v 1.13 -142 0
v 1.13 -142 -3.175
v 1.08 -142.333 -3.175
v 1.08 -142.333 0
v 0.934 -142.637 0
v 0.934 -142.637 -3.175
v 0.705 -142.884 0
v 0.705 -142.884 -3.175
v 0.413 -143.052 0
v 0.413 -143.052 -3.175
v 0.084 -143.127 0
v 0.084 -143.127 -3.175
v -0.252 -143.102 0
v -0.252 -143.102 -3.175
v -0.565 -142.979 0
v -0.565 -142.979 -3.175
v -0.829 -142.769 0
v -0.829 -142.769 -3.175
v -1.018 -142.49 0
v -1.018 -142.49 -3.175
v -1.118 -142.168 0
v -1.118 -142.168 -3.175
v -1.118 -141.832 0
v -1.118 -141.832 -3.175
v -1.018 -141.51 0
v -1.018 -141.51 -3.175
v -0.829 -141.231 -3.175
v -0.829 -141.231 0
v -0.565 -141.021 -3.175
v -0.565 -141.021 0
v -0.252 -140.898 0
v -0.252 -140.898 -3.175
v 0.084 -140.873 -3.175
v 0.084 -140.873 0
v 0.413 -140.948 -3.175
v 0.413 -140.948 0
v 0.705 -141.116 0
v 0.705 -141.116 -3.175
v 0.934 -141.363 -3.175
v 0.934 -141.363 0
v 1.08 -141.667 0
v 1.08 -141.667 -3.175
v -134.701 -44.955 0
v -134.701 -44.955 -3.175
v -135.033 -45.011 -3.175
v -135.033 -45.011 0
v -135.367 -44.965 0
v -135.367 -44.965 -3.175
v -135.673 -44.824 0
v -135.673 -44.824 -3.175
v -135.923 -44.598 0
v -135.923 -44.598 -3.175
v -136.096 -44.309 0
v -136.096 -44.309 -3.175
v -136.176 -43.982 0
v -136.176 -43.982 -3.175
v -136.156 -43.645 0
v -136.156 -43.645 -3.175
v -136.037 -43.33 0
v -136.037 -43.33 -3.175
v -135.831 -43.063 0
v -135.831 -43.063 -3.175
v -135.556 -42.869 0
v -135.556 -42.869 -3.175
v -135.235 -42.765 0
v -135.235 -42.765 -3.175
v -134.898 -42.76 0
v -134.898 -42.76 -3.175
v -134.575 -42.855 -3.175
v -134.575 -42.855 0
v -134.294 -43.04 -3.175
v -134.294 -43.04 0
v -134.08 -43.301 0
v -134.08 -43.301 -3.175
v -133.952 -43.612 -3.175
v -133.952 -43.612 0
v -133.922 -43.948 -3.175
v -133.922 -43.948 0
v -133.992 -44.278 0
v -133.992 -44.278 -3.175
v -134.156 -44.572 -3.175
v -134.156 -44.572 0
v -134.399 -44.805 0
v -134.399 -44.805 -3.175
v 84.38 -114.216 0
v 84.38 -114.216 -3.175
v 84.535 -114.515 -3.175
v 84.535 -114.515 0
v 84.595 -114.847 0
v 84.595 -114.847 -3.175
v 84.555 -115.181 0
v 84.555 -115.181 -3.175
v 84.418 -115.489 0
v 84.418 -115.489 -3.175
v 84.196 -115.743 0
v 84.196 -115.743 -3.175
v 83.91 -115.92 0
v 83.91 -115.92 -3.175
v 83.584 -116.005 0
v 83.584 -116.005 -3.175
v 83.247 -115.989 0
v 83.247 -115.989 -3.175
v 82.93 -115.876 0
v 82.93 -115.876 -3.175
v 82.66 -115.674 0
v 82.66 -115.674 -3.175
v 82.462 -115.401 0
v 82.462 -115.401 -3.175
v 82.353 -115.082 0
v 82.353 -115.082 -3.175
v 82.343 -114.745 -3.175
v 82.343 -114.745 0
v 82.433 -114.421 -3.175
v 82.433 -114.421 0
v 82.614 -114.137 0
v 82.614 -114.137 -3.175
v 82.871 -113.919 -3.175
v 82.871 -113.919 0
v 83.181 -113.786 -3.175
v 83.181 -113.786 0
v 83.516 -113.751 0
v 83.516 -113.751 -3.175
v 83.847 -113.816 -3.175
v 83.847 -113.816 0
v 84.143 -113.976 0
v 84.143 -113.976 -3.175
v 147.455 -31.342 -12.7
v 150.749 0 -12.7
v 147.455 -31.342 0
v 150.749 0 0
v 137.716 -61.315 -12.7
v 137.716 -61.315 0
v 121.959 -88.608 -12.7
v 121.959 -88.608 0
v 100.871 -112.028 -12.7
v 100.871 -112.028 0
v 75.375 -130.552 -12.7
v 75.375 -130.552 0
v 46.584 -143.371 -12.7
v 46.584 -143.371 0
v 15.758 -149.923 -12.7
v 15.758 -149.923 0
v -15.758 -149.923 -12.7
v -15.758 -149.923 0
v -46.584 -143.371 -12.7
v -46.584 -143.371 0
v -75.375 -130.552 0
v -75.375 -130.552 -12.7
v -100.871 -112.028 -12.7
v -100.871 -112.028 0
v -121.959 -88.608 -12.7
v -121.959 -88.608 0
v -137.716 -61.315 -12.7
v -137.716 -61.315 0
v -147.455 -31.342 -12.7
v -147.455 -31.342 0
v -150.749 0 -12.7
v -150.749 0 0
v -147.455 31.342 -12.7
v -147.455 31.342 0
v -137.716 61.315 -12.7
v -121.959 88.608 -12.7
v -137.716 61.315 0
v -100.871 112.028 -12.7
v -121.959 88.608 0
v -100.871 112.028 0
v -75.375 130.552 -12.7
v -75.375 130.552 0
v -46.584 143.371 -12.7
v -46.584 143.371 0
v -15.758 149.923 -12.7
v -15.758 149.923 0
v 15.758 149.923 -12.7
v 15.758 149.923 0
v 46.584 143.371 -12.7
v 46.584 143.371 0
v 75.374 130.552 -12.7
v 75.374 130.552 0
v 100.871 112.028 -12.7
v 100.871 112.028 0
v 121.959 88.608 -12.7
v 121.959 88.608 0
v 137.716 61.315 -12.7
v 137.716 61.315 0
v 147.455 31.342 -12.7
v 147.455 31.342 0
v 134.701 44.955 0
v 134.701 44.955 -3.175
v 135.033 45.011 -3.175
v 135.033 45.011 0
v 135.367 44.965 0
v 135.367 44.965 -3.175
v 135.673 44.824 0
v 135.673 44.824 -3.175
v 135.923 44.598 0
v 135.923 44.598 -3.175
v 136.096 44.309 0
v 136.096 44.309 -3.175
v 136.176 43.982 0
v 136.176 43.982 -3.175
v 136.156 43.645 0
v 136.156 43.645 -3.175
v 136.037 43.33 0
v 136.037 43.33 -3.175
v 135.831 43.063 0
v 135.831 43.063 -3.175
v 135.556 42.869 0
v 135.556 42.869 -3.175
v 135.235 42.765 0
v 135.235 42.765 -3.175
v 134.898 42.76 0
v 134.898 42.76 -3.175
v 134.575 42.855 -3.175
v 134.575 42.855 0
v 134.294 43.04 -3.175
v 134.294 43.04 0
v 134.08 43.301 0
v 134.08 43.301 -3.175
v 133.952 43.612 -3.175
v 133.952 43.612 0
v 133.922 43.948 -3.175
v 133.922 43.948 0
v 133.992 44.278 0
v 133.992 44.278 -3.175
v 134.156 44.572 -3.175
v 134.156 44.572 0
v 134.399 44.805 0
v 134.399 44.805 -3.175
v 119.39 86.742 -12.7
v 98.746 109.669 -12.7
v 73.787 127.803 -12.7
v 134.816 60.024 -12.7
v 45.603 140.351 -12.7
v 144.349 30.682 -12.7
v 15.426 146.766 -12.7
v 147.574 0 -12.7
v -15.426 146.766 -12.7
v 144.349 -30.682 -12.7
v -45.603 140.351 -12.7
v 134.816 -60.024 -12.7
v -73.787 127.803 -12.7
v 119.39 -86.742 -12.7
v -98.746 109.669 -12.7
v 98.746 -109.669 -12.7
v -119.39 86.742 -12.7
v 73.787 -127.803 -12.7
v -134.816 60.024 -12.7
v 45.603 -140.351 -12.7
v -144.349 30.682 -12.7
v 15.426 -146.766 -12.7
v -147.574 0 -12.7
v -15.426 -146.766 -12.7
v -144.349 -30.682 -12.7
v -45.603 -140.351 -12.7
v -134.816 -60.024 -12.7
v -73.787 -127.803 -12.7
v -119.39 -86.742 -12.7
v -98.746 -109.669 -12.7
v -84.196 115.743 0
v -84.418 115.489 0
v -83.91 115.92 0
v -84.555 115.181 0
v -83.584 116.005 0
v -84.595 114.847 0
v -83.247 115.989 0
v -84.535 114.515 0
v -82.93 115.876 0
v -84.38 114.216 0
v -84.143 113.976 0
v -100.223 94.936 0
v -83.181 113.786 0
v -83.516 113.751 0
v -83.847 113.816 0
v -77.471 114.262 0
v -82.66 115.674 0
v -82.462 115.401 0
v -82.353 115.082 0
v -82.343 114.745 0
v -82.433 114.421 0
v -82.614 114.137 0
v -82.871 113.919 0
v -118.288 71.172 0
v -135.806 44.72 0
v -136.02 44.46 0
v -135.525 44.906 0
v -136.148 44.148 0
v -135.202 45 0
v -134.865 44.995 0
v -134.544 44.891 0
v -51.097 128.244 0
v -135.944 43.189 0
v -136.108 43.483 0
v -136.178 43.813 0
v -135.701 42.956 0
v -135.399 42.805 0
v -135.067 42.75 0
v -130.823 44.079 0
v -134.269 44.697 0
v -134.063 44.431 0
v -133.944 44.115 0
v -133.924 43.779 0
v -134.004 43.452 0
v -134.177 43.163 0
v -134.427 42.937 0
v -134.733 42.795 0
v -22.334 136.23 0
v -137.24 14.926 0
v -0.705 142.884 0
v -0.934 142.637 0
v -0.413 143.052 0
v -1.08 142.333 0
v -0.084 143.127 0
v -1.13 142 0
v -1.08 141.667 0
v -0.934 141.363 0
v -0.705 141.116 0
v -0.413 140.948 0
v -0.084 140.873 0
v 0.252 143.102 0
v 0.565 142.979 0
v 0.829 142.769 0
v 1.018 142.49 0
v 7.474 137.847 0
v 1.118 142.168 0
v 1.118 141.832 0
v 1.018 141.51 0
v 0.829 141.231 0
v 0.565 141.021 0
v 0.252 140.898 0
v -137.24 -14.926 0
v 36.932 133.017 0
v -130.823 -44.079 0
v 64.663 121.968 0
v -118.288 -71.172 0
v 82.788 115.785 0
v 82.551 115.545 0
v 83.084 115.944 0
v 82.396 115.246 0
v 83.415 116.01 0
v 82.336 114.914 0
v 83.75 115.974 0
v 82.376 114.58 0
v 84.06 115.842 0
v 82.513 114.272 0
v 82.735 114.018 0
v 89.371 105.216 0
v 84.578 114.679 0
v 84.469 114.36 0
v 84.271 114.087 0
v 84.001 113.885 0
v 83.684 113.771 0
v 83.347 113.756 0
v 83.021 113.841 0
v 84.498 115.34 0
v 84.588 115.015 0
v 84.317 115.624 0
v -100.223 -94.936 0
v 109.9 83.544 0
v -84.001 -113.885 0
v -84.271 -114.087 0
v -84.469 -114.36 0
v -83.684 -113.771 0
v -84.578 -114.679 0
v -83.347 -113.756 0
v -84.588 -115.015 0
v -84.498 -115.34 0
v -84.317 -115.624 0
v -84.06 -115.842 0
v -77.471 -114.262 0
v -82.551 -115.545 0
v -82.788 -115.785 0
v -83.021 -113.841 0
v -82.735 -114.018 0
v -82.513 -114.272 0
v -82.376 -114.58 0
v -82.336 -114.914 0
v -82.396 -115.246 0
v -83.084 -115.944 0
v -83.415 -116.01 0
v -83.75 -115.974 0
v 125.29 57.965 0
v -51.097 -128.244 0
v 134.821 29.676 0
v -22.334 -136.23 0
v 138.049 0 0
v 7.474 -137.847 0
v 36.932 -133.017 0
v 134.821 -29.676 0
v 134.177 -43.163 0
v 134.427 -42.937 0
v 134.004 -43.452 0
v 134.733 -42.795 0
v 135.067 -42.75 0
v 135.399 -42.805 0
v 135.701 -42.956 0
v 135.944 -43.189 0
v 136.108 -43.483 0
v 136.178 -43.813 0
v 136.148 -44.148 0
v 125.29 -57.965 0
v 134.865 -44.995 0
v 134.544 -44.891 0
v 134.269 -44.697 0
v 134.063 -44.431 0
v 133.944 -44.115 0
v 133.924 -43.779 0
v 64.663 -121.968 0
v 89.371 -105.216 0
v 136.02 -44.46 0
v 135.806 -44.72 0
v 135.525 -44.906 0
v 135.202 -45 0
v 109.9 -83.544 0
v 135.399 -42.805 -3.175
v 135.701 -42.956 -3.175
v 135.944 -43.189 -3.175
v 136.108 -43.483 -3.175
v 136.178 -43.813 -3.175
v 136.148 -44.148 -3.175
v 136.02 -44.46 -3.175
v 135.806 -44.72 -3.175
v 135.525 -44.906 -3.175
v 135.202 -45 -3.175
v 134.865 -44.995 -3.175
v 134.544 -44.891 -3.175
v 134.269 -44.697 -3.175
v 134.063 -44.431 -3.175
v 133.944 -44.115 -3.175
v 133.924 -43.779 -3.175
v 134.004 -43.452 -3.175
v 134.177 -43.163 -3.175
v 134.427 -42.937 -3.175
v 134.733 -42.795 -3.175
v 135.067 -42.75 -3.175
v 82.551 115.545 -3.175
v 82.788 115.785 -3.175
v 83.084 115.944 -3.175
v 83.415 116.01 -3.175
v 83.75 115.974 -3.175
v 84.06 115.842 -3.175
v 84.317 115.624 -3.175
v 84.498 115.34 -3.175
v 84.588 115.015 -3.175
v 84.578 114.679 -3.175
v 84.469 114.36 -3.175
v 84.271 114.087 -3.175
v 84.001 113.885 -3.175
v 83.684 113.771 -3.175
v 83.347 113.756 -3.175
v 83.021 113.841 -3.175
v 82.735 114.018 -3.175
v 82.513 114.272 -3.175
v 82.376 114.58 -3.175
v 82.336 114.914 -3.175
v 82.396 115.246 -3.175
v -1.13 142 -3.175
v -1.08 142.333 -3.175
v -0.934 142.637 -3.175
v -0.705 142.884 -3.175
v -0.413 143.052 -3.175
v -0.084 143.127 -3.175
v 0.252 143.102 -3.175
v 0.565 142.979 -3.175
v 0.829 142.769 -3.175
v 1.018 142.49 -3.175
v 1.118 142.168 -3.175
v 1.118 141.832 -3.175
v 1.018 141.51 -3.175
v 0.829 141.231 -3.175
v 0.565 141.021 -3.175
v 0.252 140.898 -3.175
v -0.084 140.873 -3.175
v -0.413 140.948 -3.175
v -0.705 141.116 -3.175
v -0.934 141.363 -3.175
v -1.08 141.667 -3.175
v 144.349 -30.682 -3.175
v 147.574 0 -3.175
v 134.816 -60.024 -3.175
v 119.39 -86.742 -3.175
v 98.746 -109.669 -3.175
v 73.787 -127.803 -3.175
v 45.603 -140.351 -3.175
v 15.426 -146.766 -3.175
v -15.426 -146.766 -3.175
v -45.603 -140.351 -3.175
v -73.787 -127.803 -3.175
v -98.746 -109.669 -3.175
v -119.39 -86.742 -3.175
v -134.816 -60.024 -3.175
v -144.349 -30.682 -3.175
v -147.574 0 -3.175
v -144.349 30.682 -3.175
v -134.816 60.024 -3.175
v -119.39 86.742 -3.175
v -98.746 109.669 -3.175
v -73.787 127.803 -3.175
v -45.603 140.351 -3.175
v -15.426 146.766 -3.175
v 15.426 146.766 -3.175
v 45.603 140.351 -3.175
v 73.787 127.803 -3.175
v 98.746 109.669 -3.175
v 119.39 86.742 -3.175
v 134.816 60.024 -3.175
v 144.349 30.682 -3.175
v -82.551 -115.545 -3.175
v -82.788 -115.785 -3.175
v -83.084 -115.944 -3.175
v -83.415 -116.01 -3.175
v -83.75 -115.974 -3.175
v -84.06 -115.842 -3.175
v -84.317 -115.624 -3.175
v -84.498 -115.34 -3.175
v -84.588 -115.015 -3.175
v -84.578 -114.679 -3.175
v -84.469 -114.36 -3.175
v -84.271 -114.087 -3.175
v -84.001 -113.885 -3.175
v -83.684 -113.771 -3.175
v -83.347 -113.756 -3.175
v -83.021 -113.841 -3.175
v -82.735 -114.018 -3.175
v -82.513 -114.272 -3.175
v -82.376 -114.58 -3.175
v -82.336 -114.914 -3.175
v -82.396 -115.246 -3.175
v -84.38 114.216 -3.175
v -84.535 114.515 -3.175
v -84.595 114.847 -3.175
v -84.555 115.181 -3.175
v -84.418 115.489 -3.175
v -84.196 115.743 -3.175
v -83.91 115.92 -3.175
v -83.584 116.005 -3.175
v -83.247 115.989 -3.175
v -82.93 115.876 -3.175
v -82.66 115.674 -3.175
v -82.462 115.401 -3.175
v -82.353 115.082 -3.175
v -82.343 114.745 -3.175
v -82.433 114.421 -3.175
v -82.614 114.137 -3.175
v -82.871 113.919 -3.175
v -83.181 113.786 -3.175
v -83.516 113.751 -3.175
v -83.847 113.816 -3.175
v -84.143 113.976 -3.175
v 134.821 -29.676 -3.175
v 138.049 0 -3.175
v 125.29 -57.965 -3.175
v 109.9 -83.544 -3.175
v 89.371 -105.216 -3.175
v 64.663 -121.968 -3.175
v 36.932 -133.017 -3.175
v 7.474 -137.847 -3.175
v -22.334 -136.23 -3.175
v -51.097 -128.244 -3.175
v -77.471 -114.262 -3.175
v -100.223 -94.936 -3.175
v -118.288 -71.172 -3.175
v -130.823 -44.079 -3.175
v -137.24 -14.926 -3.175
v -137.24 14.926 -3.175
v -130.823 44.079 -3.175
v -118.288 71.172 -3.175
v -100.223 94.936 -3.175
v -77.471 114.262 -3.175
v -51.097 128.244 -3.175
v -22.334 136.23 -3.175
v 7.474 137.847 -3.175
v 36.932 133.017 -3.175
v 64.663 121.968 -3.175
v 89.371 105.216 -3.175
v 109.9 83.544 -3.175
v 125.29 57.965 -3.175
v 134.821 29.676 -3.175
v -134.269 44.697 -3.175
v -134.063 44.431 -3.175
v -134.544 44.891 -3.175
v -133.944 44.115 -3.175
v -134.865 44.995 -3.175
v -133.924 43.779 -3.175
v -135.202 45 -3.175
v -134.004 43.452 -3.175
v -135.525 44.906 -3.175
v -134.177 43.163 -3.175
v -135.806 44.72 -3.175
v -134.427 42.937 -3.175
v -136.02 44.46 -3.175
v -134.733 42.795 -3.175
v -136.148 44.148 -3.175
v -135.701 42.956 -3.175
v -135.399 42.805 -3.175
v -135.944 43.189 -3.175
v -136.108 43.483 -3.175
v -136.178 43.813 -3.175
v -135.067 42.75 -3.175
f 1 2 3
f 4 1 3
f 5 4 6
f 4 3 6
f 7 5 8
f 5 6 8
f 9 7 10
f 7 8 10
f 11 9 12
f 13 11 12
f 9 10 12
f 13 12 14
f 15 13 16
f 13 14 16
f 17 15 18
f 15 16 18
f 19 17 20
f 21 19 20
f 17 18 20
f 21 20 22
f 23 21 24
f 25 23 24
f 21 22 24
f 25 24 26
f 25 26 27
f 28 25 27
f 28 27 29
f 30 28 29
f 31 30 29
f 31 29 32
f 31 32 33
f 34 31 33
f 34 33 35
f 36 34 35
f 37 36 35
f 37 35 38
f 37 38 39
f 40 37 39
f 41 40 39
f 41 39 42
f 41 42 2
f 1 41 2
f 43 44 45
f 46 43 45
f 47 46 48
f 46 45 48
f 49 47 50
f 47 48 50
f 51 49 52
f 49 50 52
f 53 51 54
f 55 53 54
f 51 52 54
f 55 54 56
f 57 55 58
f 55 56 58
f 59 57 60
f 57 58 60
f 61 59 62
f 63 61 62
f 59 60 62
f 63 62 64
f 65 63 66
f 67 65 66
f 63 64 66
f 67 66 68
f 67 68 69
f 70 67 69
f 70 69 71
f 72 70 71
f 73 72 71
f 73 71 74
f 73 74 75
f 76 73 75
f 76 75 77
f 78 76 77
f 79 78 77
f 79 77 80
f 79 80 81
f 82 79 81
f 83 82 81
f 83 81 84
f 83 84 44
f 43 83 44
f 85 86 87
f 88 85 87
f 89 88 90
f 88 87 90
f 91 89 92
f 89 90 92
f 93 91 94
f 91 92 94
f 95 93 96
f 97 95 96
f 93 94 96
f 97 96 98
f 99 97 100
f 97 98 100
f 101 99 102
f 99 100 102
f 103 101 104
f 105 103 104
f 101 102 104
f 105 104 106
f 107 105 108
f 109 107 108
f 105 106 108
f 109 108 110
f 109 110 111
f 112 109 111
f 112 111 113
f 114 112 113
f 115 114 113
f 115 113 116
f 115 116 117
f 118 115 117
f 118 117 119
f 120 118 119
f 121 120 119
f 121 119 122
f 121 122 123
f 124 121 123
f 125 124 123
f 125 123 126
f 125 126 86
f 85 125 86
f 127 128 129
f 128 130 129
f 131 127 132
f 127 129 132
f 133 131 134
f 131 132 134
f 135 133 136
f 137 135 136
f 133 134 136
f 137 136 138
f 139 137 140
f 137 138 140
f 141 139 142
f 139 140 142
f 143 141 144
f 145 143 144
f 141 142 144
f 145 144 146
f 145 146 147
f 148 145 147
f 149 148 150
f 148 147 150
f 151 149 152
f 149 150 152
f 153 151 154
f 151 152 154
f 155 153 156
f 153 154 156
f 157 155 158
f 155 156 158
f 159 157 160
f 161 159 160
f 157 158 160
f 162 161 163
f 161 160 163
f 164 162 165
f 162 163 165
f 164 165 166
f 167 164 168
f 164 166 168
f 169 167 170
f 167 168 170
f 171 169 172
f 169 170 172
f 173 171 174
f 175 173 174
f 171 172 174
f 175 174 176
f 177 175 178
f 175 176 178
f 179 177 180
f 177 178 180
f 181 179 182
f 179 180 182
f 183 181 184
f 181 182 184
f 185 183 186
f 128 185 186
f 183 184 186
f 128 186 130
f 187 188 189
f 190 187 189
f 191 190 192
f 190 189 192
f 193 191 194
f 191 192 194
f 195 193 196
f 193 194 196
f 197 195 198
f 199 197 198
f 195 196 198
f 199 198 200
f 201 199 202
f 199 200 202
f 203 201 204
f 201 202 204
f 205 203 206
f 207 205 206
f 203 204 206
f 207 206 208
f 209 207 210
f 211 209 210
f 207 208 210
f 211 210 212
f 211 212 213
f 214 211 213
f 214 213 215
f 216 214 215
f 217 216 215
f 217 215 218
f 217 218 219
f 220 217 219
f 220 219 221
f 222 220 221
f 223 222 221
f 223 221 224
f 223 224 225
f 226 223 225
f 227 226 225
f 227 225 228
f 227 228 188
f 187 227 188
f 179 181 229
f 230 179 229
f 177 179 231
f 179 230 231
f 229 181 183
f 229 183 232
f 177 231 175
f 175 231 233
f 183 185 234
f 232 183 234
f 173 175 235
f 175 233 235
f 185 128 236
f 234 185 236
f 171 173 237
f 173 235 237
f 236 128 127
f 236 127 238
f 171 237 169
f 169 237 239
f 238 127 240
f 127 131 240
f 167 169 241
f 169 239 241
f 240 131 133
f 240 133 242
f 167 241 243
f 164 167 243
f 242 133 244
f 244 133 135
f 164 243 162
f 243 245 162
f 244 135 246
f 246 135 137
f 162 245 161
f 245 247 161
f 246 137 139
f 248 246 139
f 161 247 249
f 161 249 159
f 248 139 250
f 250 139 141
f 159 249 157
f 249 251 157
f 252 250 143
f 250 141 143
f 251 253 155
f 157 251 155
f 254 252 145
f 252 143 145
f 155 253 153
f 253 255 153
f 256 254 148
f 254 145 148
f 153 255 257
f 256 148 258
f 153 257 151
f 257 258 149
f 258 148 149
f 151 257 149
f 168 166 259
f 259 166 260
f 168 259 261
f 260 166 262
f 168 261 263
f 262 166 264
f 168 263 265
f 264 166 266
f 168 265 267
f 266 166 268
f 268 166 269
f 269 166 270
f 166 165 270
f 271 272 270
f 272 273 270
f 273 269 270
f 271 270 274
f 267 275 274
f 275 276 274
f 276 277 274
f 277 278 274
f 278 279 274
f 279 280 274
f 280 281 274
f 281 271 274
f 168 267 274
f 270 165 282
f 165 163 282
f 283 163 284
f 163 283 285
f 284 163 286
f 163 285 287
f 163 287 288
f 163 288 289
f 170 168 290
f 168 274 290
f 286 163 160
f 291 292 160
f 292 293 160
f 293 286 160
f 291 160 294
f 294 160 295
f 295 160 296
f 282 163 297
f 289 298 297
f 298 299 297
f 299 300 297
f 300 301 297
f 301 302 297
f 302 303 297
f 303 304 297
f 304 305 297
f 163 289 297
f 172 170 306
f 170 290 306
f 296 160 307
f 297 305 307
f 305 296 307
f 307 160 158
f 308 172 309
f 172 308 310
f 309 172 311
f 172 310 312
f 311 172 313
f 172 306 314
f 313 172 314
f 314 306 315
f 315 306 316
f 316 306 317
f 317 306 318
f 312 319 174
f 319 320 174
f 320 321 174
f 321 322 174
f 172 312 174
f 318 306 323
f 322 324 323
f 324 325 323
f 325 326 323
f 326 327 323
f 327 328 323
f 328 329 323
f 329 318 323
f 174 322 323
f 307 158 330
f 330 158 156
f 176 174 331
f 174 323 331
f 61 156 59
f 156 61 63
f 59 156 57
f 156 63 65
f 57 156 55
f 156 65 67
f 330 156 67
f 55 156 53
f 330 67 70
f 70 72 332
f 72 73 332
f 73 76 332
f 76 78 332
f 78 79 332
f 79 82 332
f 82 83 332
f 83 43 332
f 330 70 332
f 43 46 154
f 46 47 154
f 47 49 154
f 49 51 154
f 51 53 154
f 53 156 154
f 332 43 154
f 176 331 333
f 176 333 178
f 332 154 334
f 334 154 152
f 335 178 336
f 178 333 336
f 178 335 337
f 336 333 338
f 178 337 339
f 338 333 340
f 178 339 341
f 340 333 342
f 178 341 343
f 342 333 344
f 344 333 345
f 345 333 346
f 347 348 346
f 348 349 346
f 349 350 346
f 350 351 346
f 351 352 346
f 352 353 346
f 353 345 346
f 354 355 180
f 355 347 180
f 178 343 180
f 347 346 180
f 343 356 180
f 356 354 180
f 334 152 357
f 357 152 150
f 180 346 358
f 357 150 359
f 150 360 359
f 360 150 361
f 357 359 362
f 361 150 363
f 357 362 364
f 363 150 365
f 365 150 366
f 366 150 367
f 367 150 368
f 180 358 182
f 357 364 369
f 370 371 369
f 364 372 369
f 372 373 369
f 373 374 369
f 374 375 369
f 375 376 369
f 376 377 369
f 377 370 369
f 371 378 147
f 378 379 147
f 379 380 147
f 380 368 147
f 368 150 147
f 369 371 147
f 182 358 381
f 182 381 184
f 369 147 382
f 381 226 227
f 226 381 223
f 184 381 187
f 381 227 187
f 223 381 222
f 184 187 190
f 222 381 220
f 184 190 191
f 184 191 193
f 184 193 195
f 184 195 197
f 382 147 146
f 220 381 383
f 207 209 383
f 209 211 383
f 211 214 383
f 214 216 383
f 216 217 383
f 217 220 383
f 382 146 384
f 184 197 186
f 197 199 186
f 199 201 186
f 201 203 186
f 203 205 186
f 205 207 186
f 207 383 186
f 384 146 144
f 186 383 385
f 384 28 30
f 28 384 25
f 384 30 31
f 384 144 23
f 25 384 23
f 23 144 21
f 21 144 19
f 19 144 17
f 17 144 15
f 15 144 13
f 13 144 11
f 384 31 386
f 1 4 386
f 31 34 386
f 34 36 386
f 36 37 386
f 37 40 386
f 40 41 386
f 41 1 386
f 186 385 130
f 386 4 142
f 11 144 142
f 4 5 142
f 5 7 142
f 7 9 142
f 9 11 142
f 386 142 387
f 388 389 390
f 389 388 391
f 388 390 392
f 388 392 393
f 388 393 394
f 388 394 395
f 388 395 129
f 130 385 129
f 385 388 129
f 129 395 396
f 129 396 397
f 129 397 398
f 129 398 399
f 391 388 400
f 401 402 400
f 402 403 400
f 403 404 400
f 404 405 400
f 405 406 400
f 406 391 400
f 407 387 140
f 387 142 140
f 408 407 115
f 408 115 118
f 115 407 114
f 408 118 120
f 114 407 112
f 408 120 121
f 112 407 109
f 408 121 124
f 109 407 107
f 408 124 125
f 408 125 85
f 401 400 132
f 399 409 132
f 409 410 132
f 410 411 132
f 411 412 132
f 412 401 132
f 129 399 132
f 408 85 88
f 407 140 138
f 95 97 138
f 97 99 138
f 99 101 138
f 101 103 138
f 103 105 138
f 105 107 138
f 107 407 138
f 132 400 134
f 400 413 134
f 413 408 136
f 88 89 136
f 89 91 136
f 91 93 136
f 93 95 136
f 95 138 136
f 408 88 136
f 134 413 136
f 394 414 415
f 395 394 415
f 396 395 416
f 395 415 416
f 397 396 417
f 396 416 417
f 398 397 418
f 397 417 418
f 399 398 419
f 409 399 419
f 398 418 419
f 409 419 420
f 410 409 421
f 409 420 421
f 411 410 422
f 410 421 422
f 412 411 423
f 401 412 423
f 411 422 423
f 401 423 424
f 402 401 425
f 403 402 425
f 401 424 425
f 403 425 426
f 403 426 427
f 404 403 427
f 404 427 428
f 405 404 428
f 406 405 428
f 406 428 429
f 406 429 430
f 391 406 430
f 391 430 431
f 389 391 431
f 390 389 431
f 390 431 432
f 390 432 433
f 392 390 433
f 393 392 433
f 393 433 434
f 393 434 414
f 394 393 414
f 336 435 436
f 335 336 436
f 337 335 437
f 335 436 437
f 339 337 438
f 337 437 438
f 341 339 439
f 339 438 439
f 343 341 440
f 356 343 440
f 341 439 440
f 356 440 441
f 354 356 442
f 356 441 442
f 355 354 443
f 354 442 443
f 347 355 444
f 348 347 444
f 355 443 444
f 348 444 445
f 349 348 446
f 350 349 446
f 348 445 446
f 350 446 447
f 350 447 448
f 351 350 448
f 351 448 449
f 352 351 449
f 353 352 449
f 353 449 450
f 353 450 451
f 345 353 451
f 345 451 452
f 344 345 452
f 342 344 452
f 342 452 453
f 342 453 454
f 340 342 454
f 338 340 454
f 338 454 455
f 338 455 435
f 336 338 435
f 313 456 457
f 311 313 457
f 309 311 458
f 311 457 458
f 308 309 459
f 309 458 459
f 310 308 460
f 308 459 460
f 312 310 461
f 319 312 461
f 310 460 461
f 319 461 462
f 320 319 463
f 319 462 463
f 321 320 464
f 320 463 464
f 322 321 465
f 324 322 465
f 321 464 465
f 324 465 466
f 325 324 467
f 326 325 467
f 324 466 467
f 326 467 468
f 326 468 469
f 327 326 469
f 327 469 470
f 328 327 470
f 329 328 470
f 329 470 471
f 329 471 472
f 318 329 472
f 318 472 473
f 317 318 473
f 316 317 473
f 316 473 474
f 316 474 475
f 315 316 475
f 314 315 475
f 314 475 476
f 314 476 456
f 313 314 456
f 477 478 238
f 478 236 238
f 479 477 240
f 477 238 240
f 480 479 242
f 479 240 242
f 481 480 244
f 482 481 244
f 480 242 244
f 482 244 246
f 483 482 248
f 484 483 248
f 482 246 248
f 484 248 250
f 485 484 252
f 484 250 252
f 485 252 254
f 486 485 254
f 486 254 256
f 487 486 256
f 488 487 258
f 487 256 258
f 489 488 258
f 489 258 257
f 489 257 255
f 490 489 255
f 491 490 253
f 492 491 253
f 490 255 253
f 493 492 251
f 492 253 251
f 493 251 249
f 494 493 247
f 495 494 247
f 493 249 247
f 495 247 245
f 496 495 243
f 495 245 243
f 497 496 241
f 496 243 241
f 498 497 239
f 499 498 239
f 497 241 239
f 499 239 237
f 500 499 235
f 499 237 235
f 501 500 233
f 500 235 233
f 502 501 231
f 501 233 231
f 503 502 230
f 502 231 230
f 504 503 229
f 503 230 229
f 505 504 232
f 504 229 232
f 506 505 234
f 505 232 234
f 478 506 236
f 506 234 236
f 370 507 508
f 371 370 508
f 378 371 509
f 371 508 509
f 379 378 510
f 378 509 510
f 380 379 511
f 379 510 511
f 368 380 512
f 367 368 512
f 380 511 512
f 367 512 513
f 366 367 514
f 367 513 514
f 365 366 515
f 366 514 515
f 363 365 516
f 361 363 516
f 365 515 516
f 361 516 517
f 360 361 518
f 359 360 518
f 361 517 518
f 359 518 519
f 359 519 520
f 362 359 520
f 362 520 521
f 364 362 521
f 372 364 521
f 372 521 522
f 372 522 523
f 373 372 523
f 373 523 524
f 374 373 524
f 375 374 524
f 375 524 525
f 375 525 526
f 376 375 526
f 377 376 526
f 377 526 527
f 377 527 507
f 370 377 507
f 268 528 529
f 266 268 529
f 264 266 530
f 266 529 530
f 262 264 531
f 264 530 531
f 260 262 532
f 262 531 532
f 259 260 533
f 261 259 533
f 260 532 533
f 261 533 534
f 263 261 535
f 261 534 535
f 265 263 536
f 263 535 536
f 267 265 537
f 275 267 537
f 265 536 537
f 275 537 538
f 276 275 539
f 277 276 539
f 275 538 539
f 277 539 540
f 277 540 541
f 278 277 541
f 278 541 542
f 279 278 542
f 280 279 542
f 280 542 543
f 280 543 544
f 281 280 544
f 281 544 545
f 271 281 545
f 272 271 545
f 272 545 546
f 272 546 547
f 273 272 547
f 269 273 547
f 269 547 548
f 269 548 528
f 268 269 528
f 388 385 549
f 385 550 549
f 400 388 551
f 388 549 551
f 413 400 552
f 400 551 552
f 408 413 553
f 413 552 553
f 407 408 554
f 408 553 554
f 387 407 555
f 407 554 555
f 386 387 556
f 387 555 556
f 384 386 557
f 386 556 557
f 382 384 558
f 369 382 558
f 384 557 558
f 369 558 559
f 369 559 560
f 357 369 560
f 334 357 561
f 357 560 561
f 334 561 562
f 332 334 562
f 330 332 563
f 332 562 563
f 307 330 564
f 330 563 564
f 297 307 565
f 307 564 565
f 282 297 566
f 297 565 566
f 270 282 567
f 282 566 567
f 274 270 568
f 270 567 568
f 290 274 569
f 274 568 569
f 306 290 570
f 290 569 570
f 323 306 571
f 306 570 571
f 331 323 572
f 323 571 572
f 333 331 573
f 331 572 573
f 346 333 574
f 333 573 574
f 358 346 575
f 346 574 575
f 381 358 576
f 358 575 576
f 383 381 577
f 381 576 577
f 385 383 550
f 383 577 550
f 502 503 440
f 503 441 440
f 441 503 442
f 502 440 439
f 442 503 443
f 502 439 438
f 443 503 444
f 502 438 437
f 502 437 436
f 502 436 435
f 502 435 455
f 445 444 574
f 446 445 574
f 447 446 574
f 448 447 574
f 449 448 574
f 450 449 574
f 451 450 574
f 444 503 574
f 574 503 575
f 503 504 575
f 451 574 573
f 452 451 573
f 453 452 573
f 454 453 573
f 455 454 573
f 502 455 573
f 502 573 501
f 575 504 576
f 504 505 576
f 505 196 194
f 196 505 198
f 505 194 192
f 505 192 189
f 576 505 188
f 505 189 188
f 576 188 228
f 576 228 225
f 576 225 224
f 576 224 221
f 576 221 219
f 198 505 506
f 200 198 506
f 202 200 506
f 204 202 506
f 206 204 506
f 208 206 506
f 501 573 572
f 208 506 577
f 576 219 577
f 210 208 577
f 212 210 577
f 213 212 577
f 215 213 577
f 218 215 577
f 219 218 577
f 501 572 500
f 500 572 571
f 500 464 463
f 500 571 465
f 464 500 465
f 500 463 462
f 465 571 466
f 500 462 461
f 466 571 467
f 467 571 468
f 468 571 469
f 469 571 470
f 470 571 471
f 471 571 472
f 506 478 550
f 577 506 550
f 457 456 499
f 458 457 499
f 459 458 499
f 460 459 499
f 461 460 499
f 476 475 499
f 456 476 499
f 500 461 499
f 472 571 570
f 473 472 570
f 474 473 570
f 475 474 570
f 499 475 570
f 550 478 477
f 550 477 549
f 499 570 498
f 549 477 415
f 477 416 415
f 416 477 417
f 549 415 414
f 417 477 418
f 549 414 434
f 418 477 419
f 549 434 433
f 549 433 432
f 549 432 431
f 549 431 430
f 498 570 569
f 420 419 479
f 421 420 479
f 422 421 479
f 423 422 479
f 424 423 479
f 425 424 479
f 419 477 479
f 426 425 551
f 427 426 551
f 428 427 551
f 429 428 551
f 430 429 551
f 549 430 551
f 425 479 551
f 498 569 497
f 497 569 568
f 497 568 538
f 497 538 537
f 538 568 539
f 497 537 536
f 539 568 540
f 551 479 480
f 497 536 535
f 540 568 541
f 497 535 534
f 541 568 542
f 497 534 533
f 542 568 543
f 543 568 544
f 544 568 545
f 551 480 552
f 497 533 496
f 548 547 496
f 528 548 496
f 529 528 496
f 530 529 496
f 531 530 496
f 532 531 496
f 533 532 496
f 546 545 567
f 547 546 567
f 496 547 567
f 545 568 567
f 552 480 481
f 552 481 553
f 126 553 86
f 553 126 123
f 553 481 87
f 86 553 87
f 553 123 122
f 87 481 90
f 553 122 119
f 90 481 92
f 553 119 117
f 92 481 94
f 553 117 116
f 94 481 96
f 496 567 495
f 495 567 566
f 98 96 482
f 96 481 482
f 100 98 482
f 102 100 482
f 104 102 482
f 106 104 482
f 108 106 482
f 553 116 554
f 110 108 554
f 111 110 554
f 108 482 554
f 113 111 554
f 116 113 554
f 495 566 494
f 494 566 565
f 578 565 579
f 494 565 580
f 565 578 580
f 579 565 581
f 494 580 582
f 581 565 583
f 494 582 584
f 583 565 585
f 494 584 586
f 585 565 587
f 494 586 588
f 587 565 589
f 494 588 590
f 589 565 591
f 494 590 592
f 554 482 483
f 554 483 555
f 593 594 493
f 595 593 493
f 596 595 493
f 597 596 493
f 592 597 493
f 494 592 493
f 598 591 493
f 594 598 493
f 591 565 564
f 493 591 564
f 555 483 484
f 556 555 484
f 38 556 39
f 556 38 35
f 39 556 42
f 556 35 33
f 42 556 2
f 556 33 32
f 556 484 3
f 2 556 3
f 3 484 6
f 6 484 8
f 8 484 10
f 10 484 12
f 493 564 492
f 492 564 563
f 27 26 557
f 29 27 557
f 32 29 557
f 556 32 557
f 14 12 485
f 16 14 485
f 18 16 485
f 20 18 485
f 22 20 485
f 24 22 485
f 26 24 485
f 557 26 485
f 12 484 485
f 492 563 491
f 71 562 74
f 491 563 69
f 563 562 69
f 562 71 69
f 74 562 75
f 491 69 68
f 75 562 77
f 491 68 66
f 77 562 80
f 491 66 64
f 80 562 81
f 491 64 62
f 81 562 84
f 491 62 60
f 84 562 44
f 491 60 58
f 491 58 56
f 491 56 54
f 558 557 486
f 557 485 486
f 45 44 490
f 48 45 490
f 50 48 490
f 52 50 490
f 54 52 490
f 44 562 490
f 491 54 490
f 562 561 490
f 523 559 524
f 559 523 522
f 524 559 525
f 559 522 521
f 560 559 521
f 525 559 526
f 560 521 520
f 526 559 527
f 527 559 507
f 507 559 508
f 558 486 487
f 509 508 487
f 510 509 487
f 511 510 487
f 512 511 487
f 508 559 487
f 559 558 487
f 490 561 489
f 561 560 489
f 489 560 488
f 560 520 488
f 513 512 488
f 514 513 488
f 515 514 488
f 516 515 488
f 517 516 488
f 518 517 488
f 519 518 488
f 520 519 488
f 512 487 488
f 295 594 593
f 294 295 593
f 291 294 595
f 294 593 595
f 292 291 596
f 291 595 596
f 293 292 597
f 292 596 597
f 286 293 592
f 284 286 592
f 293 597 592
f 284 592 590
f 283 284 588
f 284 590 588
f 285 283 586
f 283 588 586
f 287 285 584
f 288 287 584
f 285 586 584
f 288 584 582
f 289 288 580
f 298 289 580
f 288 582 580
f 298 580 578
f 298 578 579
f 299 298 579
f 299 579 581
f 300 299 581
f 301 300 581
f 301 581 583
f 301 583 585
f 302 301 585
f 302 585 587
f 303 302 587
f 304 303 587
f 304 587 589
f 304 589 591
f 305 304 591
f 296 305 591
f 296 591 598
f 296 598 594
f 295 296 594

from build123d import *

# Parameters (mm, degrees)
F_4_40_TAPPED_HOLE1_D = 2.2606
CIRPATTERN1_COUNT     = 10


with BuildPart() as part:
    # Sketch1 → Revolve1 (revolve)
    with BuildSketch(Plane(origin=(0, 0, 0), x_dir=(0, 0, -1), z_dir=(1, 0, 0)), mode=Mode.PRIVATE) as revolve1_sk:
        Polygon((3.175, 147.574), (12.7, 147.574), (12.7, 150.749), (0, 150.749), (0, 138.049), (3.175, 138.049), align=None)
    revolve(revolve1_sk.sketch.rotate(Axis((0, 0, 0), (0, 0, -1)), 90), axis=Axis((0, 0, 0), (0, 0, -1)))

    # #4-40 Tapped Hole1 (through all)
    with Locations(Plane.XY):
        with Locations((0, 142)):
            f_4_40_tapped_hole1 = Hole(F_4_40_TAPPED_HOLE1_D / 2)

    # CirPattern1: #4-40 Tapped Hole1 ×10 about axis
    cirpattern1_axis = Axis((0, 0, 0), (0, 0, 1))
    for i in range(1, CIRPATTERN1_COUNT):
        add(f_4_40_tapped_hole1.rotate(cirpattern1_axis, i * 360 / CIRPATTERN1_COUNT), mode=Mode.SUBTRACT)


solid = part.part
